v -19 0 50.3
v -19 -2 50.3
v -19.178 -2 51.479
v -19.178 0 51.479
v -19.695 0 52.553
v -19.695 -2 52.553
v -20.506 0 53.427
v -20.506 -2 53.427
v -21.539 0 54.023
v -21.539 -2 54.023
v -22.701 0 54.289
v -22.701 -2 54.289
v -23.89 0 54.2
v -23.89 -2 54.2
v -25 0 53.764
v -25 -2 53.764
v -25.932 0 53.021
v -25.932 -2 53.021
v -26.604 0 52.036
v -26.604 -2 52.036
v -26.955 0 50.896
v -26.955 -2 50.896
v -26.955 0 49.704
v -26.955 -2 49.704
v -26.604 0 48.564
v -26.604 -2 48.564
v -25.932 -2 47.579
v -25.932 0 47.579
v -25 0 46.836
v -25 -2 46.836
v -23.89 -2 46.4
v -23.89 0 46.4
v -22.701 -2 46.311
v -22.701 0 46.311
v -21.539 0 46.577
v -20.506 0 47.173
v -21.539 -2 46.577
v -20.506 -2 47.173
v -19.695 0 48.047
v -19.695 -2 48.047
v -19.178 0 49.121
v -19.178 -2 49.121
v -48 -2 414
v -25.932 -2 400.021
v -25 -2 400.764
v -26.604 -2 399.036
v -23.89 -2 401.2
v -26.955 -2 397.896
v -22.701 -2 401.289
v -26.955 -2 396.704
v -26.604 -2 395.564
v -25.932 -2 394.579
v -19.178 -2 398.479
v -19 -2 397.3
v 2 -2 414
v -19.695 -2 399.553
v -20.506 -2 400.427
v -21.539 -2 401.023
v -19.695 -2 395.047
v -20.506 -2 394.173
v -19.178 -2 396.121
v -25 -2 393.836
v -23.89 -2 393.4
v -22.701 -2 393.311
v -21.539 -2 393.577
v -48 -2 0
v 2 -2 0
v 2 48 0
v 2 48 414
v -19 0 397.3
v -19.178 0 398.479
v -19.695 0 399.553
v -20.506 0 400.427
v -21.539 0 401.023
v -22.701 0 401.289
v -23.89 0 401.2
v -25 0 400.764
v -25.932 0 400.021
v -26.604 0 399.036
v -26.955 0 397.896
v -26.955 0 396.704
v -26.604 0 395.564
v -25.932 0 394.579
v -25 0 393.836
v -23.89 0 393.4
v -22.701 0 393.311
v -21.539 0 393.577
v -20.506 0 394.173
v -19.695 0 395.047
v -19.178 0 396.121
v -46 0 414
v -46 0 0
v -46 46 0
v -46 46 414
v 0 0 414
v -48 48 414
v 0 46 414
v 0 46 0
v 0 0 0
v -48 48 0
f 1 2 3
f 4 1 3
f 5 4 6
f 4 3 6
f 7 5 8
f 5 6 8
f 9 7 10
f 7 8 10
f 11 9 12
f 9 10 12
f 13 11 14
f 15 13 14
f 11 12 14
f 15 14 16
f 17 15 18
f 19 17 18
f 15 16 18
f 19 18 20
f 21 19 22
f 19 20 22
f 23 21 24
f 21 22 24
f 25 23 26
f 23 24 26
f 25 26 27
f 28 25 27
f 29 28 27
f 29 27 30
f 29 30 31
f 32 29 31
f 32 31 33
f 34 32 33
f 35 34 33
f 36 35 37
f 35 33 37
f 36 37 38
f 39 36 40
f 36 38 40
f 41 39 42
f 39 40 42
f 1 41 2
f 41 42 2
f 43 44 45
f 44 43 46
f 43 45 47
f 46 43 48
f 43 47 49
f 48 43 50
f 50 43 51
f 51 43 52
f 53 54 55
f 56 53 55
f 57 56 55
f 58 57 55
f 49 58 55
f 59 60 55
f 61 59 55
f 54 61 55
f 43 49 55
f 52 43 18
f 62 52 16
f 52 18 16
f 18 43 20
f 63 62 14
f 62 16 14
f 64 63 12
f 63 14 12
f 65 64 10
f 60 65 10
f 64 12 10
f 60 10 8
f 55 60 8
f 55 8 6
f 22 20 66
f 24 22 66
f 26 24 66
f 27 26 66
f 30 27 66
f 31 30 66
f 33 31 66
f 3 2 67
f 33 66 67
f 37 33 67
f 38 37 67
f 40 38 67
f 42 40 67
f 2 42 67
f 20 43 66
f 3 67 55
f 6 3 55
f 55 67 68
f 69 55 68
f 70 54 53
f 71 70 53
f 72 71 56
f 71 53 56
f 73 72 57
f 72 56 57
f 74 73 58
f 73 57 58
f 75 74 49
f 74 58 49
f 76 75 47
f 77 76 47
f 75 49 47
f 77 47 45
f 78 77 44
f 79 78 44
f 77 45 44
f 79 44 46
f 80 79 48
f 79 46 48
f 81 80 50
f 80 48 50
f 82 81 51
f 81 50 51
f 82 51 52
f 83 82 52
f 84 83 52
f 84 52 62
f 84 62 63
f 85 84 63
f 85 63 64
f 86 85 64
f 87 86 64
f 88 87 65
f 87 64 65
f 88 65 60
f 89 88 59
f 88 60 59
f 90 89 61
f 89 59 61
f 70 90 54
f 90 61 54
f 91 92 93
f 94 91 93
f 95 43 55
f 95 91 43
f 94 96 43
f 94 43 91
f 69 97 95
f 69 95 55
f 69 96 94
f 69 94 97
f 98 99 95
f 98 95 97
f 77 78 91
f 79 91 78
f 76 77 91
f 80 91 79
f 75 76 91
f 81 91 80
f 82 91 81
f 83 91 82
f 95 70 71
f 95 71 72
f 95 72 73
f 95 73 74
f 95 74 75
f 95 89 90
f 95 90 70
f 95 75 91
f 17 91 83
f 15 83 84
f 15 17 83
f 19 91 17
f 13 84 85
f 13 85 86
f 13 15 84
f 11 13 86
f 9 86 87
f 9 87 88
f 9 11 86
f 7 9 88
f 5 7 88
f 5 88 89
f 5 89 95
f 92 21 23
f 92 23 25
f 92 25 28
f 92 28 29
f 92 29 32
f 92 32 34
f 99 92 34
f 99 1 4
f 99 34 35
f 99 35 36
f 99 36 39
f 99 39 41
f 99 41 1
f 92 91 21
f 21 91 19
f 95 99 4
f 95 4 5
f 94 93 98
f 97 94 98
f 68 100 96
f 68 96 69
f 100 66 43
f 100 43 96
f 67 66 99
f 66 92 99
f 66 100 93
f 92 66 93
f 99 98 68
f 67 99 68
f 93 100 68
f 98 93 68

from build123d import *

# Parameters (mm, degrees)
SKETCH1_W          = 50
SKETCH1_H          = 50
SKETCH1_W_2        = 46
SKETCH1_H_2        = 46
STEELTUBE_DEPTH    = 414
SKETCH2_R          = 4
CUT_EXTRUDE1_DEPTH = 2


with BuildPart() as part:
    # Sketch1 → steelTube (new body)
    with BuildSketch(Plane.XY):
        with Locations((-23, 23)):
            Rectangle(SKETCH1_W, SKETCH1_H)
        with Locations((-23, 23)):
            Rectangle(SKETCH1_W_2, SKETCH1_H_2, mode=Mode.SUBTRACT)
    extrude(amount=STEELTUBE_DEPTH)

    # Sketch2 → Cut-Extrude1 (cut)
    with BuildSketch(Plane.XZ.offset(2)):
        with Locations((-23, 50.3)):
            Circle(SKETCH2_R)
        with Locations((-23, 397.3)):
            Circle(SKETCH2_R)
    extrude(amount=-CUT_EXTRUDE1_DEPTH, mode=Mode.SUBTRACT)


solid = part.part
